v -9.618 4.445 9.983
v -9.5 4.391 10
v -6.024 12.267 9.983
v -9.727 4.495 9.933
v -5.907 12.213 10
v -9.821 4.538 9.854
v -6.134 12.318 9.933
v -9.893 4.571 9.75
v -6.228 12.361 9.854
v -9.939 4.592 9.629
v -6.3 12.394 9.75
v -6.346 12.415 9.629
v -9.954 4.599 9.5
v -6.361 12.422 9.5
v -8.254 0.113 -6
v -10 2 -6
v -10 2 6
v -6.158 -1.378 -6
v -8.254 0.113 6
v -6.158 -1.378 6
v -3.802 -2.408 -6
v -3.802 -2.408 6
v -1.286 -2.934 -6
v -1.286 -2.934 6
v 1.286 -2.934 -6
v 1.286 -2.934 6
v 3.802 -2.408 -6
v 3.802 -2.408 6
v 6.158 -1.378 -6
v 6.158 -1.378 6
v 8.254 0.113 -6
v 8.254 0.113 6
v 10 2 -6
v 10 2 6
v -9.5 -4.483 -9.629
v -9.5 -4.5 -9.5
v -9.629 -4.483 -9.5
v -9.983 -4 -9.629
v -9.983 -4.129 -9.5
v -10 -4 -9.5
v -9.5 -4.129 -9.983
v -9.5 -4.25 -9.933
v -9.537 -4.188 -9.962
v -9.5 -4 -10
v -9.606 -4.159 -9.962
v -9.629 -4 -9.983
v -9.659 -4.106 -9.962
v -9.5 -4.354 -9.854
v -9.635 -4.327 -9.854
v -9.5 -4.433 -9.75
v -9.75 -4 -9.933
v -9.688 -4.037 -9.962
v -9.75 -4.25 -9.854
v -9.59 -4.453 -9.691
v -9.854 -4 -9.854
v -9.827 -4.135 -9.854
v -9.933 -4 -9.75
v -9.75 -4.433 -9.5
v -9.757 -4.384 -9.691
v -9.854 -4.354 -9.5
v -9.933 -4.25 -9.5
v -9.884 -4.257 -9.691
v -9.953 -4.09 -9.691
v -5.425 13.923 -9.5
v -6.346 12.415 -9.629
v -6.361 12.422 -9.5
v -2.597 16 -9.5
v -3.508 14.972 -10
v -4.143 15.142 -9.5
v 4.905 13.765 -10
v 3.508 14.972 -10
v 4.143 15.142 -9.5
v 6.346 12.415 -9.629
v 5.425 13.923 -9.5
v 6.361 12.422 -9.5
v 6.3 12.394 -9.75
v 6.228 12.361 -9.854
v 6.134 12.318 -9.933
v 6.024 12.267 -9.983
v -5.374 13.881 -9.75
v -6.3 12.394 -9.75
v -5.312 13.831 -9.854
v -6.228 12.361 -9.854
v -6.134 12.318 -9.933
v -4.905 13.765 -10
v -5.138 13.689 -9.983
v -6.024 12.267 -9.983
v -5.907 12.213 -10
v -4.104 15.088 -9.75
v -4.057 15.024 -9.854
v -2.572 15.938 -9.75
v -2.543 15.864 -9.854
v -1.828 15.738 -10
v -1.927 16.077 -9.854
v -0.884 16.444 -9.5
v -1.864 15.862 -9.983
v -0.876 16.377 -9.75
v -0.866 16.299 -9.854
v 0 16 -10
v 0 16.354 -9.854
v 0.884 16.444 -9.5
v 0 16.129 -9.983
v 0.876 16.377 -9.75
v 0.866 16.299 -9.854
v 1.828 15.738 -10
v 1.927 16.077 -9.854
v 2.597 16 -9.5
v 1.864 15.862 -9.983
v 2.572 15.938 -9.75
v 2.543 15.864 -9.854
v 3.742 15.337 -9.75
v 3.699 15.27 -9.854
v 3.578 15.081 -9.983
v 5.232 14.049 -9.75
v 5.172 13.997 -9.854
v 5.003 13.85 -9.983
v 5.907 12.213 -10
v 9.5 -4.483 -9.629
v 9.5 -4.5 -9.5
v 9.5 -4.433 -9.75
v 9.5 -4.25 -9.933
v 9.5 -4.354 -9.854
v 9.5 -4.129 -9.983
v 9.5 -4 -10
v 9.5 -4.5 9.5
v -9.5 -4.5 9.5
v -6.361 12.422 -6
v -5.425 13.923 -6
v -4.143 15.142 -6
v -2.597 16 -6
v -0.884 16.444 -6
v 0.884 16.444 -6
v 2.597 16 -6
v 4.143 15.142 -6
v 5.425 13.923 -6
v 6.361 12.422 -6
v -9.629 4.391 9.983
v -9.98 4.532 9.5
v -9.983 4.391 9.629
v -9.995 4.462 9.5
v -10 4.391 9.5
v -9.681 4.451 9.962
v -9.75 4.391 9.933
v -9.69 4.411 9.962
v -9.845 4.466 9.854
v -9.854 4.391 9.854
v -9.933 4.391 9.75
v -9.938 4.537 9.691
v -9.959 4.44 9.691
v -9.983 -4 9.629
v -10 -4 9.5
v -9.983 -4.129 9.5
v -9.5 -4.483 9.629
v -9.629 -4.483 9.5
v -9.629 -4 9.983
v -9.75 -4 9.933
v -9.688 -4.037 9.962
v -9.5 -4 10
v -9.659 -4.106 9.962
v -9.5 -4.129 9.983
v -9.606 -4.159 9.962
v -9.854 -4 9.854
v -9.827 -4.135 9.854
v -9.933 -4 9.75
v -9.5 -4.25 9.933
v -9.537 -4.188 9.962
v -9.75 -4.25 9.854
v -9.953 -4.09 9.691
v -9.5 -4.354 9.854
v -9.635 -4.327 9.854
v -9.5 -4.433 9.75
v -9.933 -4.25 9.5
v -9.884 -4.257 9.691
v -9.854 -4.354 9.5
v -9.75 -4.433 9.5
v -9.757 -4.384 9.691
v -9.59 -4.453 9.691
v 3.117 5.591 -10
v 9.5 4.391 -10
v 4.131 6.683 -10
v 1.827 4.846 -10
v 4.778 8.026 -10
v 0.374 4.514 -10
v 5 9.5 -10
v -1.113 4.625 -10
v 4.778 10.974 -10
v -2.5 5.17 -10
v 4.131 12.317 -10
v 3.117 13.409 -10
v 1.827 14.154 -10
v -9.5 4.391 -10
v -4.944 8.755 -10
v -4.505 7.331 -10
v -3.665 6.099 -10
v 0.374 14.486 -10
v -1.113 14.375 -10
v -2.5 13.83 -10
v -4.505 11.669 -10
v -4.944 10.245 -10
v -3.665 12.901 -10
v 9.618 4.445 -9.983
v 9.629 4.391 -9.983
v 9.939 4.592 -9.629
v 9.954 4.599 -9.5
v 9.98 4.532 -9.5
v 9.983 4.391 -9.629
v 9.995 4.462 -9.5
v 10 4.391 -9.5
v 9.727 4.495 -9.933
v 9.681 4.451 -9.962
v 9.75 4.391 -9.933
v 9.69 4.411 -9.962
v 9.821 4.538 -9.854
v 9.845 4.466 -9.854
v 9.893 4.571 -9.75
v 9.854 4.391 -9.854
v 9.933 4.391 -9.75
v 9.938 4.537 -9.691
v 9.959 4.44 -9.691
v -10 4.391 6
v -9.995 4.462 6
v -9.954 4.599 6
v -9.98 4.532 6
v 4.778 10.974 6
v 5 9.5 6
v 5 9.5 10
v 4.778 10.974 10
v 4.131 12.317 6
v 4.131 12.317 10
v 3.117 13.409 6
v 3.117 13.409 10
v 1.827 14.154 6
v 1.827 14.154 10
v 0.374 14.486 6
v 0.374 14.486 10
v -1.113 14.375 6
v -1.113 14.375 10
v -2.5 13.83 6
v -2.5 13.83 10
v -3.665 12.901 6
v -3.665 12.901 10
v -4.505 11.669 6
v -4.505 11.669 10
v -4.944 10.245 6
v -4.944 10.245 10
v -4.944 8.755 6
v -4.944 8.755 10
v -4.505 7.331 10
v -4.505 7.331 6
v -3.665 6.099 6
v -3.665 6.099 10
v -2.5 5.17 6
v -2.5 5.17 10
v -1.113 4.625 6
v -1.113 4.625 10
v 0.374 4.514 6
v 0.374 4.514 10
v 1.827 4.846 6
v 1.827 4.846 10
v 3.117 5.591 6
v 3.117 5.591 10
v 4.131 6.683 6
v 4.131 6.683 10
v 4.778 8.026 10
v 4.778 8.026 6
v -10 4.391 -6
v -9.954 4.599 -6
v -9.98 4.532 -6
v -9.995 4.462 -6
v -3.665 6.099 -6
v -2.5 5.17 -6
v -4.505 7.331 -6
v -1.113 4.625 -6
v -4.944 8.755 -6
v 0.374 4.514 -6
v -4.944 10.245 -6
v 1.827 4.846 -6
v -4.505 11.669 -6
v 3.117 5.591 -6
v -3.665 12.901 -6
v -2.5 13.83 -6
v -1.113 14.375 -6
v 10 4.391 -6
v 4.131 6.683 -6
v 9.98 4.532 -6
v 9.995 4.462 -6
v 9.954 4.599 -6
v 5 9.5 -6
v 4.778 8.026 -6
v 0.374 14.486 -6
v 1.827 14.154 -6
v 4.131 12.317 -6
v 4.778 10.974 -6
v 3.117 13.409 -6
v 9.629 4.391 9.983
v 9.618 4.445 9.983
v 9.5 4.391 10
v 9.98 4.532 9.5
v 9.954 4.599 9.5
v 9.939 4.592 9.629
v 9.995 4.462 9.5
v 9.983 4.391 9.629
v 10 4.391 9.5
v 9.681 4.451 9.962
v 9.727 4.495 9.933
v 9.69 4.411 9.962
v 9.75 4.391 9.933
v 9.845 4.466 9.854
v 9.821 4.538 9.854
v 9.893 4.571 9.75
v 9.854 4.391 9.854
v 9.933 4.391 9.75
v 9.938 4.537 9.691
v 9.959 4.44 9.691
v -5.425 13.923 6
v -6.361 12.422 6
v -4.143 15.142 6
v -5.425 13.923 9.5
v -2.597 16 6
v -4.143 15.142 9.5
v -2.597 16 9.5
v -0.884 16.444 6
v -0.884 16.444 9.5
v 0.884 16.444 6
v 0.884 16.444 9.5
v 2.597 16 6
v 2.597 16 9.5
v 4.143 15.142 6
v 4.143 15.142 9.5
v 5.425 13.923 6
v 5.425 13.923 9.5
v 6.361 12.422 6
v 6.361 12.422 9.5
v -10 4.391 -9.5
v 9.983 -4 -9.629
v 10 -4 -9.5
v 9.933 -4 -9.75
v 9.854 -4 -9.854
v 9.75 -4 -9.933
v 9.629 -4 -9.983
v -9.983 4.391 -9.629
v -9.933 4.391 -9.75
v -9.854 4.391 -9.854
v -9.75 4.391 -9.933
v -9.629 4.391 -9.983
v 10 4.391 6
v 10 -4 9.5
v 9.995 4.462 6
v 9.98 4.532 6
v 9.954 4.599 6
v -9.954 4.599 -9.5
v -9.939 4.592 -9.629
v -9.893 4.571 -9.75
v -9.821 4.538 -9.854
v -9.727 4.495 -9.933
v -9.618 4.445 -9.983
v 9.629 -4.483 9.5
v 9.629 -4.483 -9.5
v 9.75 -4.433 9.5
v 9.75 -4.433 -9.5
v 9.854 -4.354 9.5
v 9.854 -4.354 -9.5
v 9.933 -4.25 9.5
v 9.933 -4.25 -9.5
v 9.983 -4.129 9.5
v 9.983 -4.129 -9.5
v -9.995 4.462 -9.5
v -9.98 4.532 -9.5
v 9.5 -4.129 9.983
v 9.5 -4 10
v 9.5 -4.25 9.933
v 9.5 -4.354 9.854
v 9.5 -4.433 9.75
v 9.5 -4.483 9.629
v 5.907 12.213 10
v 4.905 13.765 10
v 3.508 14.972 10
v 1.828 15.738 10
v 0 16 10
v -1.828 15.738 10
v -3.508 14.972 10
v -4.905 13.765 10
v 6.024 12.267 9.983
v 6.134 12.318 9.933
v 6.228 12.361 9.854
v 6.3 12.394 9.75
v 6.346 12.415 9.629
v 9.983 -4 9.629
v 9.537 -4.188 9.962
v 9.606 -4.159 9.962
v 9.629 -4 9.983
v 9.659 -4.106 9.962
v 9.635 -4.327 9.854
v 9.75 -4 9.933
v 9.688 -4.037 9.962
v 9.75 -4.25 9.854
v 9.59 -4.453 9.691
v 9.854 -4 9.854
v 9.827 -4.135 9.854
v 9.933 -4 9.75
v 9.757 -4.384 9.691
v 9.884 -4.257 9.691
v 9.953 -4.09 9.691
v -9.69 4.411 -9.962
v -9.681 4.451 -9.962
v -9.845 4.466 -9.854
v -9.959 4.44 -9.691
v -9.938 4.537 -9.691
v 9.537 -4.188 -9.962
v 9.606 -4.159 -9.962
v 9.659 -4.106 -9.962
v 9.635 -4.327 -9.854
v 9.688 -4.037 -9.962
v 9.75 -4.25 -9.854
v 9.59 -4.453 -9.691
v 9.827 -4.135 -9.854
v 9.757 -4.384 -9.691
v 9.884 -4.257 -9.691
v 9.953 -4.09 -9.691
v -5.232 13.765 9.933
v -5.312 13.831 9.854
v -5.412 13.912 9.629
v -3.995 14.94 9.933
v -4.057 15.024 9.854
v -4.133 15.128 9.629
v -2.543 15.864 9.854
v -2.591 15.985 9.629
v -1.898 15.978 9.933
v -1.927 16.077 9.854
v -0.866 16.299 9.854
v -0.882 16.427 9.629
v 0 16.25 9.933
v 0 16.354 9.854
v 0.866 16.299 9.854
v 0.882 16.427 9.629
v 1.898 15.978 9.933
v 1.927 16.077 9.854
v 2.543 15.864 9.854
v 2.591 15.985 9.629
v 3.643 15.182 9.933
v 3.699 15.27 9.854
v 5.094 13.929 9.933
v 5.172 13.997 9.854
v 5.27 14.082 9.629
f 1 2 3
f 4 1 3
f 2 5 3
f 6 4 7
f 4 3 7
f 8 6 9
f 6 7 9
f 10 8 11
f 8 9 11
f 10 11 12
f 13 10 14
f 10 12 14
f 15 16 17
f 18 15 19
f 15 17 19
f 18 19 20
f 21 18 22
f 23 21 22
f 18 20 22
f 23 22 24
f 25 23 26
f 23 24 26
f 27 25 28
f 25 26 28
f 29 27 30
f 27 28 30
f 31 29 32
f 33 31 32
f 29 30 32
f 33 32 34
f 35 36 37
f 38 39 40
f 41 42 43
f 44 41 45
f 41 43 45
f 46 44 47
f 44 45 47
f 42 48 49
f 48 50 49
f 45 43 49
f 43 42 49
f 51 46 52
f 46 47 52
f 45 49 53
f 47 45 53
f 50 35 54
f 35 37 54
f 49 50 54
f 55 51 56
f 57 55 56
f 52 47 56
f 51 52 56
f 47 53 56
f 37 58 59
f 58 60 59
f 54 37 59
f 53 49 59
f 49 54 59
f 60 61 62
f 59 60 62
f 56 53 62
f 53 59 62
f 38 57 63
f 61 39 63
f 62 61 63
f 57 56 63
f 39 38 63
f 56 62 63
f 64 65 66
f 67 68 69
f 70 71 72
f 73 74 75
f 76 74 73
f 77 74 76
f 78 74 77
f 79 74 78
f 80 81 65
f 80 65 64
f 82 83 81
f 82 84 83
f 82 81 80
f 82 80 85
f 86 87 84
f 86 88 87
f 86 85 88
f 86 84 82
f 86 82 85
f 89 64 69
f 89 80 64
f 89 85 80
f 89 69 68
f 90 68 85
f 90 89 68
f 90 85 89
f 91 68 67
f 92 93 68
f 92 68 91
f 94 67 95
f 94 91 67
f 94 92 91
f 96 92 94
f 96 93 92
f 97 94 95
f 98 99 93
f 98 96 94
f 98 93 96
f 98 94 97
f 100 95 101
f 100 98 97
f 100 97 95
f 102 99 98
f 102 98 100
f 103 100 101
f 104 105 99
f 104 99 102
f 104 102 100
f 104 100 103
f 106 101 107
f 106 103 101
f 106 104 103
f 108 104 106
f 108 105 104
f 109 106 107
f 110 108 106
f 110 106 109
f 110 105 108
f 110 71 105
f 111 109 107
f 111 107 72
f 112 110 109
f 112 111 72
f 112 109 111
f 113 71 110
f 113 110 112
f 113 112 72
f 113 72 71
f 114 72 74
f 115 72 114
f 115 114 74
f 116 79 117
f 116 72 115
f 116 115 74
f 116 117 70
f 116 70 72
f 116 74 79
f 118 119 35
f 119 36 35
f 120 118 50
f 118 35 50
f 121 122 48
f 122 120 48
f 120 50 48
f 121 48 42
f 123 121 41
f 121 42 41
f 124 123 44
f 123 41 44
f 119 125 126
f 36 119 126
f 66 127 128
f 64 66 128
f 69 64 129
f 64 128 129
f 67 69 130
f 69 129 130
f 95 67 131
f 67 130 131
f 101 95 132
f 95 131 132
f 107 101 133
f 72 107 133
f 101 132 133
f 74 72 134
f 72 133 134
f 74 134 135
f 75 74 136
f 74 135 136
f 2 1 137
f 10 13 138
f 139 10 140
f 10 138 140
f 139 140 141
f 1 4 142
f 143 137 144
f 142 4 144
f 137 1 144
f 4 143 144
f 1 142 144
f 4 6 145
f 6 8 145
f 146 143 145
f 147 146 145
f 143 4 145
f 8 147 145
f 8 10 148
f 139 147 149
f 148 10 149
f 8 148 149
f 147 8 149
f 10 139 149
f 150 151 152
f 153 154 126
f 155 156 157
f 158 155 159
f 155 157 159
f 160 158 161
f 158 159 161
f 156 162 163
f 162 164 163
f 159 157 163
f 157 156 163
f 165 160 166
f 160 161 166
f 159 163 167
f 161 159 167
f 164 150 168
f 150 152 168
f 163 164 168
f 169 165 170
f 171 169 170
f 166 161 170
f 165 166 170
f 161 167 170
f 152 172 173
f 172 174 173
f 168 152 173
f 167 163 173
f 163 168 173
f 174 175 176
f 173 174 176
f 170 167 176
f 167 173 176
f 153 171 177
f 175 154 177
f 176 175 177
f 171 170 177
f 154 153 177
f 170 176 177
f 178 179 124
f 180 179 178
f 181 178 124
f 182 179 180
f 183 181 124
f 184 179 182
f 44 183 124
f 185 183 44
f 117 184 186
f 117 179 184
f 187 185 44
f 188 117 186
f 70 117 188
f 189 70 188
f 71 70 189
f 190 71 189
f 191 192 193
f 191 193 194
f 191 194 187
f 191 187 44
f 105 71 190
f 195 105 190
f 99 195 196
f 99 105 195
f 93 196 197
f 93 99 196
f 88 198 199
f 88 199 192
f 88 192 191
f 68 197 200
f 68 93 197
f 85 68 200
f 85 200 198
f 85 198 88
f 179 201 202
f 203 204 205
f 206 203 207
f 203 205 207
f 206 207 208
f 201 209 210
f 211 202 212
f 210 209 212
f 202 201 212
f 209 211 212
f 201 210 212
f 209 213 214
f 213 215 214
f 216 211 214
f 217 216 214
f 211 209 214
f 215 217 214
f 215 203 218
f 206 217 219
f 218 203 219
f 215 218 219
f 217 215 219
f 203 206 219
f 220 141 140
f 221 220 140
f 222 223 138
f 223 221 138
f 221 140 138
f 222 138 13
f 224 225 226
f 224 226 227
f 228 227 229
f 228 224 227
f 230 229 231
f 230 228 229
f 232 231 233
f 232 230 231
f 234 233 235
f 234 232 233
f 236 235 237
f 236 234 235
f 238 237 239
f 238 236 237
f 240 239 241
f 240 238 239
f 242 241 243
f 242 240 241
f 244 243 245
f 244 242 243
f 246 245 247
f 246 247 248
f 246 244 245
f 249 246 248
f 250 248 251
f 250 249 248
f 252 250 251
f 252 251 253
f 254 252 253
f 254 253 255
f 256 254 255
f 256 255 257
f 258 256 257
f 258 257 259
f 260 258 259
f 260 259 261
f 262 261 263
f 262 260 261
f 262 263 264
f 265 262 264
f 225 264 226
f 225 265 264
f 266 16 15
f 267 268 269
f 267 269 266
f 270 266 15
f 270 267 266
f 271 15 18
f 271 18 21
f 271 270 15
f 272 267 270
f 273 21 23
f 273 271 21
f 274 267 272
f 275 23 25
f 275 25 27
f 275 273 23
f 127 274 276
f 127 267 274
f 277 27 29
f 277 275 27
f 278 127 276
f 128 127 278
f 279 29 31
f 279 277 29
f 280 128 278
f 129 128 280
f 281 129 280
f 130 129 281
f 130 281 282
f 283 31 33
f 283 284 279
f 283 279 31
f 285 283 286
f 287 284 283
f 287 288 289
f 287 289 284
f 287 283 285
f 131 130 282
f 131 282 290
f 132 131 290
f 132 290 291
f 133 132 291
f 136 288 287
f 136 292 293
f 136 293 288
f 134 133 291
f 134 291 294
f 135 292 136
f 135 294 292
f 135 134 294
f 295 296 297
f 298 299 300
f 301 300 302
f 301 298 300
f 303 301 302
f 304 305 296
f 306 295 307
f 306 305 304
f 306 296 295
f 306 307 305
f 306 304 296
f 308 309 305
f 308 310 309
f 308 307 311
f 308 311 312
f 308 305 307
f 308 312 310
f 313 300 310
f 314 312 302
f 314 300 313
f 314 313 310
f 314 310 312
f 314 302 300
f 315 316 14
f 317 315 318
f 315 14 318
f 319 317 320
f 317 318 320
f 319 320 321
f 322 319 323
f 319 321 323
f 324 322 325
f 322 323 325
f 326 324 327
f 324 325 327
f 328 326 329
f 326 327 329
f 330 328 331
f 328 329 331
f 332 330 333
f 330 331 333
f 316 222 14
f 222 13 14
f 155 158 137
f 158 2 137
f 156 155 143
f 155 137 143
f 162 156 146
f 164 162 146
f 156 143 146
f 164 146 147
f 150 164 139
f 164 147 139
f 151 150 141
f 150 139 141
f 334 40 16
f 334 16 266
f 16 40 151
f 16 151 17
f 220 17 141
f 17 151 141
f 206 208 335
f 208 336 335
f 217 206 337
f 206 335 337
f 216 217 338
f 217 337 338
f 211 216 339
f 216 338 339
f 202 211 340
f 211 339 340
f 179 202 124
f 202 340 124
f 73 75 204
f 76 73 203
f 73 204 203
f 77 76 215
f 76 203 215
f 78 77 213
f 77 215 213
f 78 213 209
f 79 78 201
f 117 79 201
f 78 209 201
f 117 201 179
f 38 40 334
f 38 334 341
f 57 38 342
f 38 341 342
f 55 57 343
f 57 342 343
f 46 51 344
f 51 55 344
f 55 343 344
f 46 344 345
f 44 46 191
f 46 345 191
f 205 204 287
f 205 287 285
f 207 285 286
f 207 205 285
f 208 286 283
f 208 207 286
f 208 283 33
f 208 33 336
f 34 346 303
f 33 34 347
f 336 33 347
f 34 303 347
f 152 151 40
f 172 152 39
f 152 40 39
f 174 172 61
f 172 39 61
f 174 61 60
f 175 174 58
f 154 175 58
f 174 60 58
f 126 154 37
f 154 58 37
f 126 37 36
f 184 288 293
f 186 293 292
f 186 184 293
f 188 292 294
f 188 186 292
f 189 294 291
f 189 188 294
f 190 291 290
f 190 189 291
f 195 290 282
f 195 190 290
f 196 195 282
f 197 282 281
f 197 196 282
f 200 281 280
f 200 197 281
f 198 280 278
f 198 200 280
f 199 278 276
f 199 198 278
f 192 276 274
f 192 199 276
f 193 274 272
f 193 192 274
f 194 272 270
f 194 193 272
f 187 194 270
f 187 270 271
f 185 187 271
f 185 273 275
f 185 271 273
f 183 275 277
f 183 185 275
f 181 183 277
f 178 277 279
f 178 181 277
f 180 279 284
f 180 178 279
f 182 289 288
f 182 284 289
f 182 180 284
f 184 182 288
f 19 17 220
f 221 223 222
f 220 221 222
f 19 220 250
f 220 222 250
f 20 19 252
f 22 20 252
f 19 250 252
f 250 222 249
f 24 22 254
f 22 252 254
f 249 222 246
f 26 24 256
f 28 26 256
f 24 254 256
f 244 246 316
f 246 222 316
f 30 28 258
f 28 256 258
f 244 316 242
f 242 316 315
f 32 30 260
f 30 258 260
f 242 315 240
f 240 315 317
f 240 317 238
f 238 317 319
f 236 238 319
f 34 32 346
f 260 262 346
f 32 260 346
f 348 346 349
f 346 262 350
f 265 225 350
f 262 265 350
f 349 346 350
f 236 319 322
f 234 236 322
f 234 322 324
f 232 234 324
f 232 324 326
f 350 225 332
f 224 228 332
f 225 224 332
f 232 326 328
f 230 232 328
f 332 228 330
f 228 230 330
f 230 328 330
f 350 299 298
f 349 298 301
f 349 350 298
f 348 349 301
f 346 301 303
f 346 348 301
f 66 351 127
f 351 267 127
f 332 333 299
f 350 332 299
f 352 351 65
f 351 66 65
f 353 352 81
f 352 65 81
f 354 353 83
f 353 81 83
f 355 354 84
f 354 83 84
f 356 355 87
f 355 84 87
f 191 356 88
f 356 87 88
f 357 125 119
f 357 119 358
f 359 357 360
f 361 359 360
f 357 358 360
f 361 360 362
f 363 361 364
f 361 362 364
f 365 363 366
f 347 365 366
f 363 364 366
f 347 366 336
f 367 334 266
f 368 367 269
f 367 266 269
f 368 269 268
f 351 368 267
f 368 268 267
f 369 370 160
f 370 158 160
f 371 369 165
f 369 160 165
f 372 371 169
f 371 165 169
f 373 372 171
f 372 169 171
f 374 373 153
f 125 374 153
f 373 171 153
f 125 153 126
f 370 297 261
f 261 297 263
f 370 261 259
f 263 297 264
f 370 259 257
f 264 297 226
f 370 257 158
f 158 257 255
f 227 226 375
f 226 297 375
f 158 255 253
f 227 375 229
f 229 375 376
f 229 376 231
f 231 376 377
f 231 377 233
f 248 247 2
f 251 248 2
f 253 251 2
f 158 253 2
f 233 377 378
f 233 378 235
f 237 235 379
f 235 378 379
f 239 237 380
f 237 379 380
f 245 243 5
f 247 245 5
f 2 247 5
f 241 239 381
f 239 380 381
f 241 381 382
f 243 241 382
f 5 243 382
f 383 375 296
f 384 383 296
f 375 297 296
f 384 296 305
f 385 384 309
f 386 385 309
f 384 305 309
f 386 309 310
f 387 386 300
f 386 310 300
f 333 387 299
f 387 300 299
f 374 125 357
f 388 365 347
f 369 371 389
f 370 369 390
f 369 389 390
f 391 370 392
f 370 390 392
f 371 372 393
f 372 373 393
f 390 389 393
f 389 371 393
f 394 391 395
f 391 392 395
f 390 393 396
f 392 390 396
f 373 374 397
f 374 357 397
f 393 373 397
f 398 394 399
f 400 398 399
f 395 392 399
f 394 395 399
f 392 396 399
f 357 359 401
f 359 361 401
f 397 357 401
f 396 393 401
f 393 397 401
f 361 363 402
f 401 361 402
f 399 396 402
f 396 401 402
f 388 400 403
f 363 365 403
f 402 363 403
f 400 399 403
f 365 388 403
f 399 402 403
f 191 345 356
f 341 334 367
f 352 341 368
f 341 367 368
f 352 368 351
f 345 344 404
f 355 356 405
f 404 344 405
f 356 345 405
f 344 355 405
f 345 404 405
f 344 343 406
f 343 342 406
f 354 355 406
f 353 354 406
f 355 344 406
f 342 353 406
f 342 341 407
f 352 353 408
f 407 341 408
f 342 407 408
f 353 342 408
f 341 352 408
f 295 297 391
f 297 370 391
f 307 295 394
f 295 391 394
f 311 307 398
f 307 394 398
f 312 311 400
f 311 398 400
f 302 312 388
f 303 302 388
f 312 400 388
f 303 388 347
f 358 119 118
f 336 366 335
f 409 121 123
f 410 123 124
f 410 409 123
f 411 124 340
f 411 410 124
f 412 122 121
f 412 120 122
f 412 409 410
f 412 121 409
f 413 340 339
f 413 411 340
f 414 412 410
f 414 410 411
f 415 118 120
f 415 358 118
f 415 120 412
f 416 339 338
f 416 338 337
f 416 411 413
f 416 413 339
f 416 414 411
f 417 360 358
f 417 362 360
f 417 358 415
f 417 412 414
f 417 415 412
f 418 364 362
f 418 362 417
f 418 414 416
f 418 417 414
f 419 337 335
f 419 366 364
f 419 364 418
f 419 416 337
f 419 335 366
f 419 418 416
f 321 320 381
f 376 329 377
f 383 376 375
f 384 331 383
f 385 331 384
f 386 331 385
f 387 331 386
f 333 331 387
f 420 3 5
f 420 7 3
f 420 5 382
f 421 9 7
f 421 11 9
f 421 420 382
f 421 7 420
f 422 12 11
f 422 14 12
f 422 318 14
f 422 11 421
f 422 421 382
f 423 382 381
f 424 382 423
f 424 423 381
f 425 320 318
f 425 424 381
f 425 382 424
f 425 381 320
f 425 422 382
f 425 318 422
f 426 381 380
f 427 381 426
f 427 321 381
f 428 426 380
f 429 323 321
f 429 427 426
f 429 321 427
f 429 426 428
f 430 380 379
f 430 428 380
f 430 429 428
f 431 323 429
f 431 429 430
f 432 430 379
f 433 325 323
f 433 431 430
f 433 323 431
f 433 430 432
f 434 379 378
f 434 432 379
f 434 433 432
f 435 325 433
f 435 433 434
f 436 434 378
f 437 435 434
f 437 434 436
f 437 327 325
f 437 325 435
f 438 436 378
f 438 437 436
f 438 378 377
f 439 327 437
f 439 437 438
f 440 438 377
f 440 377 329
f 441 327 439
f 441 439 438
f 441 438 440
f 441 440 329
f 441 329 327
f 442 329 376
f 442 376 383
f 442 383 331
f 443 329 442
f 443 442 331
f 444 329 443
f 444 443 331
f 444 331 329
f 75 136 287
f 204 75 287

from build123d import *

# Parameters (mm, degrees)
SKETCH_1_R          = 5
EXTRUDE_1_DEPTH     = 10
FILLET_1_R          = 0.5
SKETCH_3_R          = 12.5
CUT_EXTRUDE_1_DEPTH = 6


with BuildPart() as part:
    # 草图1 → 凸台-拉伸1 (new, symmetric)
    with BuildSketch(Plane.XY):
        with BuildLine():
            Line((6.360983408, 12.421966817), (10, 4.5))
            Line((10, 4.5), (10, -4.5))
            Line((10, -4.5), (-10, -4.5))
            Line((-10, -4.5), (-10, 4.5))
            Line((-10, 4.5), (-6.360983408, 12.421966817))
            ThreePointArc((-6.360983408, 12.421966817), (0, 16.5), (6.360983408, 12.421966817))
        make_face()
        with Locations((0, 9.5)):
            Circle(SKETCH_1_R, mode=Mode.SUBTRACT)
    extrude(amount=EXTRUDE_1_DEPTH, both=True)

    # 圆角1
    fillet_1_edges = [part.edges().sort_by_distance(p)[0] for p in [
        (10, -4.5, 0),
        (-10, -4.5, 0),
        (-10, 4.5, 0),
        (10, 4.5, 0),
        (0, 16.5, 10),
        (-8.180491704, 8.460983408, 10),
        (-10, 0, 10),
        (0, -4.5, 10),
        (10, 0, 10),
        (0, -4.5, -10),
        (-10, 0, -10),
        (-8.180491704, 8.460983408, -10),
        (0, 16.5, -10),
        (8.180491704, 8.460983408, -10),
        (10, 0, -10),
        (8.180491704, 8.460983408, 10),
    ]]
    fillet(fillet_1_edges, radius=FILLET_1_R)

    # 草图3 → 切除-拉伸1 (cut, symmetric)
    with BuildSketch(Plane.XY):
        with Locations((0, 9.5)):
            Circle(SKETCH_3_R)
    extrude(amount=CUT_EXTRUDE_1_DEPTH, both=True, mode=Mode.SUBTRACT)


solid = part.part
